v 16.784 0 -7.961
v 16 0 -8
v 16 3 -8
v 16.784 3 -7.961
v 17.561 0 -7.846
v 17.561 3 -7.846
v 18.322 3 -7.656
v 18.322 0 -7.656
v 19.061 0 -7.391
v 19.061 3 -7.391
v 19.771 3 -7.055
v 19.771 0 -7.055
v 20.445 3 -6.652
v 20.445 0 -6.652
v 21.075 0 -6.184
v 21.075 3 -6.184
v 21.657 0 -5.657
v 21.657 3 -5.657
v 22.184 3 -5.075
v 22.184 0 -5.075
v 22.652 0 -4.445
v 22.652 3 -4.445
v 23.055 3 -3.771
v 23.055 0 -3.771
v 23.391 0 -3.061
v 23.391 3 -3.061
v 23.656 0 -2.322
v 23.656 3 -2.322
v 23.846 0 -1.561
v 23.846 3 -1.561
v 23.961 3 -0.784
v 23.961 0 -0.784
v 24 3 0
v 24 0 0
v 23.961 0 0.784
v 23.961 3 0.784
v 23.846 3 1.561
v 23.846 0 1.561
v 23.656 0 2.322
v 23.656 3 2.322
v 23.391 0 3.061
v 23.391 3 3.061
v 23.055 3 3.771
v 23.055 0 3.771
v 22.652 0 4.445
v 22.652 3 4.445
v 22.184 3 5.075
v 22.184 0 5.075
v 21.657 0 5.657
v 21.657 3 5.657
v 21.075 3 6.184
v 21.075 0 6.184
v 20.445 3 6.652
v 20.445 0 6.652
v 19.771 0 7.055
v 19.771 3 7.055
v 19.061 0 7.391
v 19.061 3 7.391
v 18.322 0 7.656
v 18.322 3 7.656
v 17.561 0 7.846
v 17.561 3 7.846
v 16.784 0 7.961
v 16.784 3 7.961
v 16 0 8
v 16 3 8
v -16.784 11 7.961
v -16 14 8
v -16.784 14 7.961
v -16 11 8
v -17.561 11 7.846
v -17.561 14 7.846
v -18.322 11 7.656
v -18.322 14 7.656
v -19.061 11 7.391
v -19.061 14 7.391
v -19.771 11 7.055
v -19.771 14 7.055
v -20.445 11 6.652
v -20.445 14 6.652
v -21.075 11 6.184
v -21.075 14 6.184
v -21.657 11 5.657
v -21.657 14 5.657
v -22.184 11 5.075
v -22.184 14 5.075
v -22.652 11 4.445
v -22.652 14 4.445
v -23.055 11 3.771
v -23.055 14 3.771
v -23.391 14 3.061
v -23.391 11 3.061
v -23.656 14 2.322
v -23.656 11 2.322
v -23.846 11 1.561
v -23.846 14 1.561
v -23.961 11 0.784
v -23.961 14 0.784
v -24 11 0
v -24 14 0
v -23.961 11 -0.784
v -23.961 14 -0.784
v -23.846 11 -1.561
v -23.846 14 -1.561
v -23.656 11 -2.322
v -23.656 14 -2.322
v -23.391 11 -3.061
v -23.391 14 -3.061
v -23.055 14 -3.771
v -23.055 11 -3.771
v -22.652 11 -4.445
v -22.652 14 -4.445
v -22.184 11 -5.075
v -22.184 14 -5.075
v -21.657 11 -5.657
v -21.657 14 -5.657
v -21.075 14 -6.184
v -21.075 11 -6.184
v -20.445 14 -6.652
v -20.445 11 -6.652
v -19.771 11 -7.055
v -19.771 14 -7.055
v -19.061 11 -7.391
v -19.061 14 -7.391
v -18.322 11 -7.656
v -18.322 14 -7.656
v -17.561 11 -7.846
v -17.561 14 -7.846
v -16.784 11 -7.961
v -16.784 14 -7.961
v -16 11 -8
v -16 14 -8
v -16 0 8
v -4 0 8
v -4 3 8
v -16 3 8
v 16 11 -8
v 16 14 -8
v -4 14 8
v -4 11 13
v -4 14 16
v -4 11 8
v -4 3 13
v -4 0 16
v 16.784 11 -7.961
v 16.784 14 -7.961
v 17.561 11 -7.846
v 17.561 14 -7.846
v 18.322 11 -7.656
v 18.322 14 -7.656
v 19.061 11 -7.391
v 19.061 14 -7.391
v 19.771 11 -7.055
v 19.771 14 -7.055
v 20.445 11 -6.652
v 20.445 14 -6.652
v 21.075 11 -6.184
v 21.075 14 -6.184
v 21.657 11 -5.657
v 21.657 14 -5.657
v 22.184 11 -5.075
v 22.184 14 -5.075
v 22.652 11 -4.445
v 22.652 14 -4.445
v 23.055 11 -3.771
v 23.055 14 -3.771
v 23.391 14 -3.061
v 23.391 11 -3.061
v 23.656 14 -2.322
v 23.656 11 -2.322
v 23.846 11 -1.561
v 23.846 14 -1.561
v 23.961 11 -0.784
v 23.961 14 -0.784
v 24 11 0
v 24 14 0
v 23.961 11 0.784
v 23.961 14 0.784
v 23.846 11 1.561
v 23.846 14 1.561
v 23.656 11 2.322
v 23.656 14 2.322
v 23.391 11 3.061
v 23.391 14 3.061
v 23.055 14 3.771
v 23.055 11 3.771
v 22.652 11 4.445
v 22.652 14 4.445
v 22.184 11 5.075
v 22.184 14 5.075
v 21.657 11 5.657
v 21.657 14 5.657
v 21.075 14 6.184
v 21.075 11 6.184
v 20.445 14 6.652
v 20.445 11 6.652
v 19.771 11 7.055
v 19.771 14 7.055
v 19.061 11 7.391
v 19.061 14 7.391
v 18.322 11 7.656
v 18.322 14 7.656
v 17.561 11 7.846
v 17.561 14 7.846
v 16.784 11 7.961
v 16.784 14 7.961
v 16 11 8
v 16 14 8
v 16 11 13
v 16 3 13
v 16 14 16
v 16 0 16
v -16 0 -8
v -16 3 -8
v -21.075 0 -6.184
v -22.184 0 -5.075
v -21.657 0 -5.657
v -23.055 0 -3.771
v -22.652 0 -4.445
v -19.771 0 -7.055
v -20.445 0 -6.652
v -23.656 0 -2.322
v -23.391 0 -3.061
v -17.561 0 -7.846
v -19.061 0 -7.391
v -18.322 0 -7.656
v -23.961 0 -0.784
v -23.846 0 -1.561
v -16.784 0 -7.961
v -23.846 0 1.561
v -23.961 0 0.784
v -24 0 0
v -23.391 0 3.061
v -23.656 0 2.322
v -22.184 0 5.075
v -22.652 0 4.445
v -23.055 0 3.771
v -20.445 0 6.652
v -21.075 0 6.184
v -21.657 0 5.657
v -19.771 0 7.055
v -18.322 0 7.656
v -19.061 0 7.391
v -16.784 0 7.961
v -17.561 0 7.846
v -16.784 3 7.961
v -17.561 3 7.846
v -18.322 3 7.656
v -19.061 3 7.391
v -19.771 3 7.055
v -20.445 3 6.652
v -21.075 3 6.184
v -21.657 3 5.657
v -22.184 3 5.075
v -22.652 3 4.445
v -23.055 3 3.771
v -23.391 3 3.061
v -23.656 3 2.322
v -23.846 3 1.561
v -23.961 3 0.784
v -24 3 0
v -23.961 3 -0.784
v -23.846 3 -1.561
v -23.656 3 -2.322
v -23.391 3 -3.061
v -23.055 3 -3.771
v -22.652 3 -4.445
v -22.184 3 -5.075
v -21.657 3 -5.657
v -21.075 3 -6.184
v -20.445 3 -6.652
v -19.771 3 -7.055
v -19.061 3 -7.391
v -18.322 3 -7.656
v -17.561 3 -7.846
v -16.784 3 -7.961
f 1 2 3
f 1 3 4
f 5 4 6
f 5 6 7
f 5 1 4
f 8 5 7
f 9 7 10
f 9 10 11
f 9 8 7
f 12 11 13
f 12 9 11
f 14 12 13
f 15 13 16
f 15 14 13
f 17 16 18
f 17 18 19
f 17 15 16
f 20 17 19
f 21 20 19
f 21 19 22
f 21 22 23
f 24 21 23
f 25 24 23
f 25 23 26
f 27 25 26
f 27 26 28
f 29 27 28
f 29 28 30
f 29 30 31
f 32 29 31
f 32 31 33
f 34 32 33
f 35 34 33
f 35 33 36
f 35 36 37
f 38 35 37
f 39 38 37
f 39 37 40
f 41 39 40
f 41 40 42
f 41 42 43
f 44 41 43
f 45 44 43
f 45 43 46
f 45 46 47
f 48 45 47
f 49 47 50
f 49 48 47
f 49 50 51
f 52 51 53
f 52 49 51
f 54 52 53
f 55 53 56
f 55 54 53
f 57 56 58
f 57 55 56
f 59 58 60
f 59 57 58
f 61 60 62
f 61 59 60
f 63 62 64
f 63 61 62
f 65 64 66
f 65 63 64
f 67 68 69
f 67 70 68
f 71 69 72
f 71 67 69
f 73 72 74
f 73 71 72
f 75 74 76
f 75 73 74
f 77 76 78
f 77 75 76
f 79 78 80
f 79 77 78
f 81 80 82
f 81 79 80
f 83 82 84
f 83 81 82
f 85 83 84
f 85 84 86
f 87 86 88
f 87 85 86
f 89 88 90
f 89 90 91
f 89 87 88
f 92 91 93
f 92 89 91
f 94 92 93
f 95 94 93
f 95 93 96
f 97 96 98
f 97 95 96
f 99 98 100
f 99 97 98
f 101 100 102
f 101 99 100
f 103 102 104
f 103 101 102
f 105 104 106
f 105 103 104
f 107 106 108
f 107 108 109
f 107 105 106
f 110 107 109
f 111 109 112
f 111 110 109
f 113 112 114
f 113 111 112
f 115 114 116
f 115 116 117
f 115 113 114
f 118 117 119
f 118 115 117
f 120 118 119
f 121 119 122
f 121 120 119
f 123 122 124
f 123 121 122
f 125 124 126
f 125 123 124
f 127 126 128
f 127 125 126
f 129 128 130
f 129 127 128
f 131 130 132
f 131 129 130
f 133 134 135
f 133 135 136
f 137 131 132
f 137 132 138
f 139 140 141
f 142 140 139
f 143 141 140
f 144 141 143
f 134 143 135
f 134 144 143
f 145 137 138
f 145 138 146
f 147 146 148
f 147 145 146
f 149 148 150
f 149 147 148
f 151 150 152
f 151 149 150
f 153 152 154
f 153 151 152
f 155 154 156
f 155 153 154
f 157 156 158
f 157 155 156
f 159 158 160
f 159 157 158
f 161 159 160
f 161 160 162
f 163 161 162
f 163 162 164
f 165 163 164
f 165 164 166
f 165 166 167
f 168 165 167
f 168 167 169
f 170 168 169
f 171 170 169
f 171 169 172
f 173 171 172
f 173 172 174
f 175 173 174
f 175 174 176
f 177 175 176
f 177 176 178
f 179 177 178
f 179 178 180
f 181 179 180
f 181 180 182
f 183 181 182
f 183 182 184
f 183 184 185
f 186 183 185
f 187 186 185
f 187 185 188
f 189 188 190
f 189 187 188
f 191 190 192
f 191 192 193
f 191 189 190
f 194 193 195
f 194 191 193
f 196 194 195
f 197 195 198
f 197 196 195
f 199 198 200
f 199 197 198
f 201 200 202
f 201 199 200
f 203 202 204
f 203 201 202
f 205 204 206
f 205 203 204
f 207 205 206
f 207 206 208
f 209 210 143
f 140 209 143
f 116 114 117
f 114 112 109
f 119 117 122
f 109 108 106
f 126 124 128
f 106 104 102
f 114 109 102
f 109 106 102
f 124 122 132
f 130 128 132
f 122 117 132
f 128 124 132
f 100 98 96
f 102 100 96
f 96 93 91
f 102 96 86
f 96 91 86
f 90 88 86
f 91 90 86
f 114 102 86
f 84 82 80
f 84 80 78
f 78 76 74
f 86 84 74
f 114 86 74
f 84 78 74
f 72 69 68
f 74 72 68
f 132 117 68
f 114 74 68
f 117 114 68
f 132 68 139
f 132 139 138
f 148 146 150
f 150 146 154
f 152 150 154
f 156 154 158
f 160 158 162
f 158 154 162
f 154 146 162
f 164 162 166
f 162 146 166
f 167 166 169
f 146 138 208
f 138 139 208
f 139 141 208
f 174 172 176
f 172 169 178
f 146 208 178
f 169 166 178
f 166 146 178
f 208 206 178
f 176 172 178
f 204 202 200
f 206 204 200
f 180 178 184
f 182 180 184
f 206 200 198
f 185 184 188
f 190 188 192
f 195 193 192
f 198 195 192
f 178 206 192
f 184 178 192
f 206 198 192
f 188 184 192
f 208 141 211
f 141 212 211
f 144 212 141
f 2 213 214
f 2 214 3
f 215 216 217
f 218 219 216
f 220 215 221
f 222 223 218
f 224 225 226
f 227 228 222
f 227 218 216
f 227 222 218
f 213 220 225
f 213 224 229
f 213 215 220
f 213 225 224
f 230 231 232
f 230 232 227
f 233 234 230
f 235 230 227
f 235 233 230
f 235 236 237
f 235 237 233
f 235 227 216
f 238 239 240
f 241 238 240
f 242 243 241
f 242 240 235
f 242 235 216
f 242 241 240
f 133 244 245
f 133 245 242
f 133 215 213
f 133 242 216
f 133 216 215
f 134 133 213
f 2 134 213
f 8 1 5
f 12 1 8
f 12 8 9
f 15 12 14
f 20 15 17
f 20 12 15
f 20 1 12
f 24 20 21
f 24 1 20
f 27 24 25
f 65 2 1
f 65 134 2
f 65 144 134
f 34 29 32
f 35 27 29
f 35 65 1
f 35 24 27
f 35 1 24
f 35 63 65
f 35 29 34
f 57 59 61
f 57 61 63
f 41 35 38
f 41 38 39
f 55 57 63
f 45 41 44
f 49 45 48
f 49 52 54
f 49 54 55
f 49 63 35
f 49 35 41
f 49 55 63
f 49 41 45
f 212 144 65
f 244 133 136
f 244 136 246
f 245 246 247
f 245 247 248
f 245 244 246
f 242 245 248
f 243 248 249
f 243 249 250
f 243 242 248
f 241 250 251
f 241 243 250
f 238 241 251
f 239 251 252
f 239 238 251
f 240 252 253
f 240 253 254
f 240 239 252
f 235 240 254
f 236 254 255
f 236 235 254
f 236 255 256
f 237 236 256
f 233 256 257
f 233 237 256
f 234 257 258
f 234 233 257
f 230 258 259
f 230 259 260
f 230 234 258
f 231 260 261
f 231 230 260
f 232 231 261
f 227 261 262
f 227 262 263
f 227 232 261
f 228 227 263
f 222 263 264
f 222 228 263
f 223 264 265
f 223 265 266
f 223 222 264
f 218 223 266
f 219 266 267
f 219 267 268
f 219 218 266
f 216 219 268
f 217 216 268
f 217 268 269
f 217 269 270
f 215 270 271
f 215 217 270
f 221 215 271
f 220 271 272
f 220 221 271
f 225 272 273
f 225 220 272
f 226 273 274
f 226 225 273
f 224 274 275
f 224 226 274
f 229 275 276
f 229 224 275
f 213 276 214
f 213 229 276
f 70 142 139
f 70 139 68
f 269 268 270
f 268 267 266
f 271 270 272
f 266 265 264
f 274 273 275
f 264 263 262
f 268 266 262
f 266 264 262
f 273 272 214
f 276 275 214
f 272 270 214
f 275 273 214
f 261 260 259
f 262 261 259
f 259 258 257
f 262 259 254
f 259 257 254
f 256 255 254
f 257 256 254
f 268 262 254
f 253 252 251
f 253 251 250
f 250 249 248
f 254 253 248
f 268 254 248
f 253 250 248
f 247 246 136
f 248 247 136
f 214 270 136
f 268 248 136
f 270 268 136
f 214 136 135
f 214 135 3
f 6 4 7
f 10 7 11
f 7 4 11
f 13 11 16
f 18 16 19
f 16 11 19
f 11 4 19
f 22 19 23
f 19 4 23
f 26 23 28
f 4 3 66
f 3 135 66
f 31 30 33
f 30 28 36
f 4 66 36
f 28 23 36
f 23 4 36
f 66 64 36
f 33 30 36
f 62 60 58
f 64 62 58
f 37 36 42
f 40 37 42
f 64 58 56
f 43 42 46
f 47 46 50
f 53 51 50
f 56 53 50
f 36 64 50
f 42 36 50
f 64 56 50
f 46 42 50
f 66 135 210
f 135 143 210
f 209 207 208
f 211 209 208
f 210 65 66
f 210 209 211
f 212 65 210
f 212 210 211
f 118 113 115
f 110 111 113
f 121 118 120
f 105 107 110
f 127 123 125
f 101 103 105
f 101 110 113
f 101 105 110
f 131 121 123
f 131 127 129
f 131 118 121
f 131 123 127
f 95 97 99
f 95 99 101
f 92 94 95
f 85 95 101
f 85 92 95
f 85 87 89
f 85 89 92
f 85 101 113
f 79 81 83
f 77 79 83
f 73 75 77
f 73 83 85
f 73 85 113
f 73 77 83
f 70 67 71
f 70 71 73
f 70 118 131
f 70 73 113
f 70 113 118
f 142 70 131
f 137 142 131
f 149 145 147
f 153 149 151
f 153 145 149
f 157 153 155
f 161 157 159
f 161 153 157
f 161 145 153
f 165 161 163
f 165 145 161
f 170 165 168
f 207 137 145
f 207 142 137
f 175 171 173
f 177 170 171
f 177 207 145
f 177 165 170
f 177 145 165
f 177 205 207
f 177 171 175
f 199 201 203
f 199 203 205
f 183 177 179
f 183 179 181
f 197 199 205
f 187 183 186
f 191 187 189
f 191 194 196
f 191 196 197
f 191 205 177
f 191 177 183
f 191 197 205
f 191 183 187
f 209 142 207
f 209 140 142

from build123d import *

# Parameters (mm, degrees)
F0_R     = 3
F1_DEPTH = 14
F2_T     = -3


with BuildPart() as f1:
    # F0 (on Front) → F1 (new body)
    with BuildSketch(Plane.XZ):
        with BuildLine():
            ThreePointArc((-16, 8), (-24, 0), (-16, -8))
            Line((-16, -8), (16, -8))
            ThreePointArc((16, -8), (24, 0), (16, 8))
            Line((16, 8), (16, 16))
            Line((16, 16), (-4, 16))
            Line((-4, 16), (-4, 8))
            Line((-4, 8), (-16, 8))
        make_face()
        with Locations((-16, 0)):
            Circle(F0_R, mode=Mode.SUBTRACT)
        with Locations((16, 0)):
            Circle(F0_R, mode=Mode.SUBTRACT)
        with Locations((-16, 0)):
            Circle(F0_R)
        with Locations((16, 0)):
            Circle(F0_R)
    extrude(amount=-F1_DEPTH)

    # F2
    f2_openings = [f1.faces().sort_by_distance(p)[0] for p in [
        (-10, 7, 8),
        (-4, 7, 12),
        (24, 7, 0),
        (-24, 7, 0),
        (0, 7, -8),
        (16, 7, 12),
    ]]
    offset(amount=F2_T, openings=f2_openings)


solid = f1.part
